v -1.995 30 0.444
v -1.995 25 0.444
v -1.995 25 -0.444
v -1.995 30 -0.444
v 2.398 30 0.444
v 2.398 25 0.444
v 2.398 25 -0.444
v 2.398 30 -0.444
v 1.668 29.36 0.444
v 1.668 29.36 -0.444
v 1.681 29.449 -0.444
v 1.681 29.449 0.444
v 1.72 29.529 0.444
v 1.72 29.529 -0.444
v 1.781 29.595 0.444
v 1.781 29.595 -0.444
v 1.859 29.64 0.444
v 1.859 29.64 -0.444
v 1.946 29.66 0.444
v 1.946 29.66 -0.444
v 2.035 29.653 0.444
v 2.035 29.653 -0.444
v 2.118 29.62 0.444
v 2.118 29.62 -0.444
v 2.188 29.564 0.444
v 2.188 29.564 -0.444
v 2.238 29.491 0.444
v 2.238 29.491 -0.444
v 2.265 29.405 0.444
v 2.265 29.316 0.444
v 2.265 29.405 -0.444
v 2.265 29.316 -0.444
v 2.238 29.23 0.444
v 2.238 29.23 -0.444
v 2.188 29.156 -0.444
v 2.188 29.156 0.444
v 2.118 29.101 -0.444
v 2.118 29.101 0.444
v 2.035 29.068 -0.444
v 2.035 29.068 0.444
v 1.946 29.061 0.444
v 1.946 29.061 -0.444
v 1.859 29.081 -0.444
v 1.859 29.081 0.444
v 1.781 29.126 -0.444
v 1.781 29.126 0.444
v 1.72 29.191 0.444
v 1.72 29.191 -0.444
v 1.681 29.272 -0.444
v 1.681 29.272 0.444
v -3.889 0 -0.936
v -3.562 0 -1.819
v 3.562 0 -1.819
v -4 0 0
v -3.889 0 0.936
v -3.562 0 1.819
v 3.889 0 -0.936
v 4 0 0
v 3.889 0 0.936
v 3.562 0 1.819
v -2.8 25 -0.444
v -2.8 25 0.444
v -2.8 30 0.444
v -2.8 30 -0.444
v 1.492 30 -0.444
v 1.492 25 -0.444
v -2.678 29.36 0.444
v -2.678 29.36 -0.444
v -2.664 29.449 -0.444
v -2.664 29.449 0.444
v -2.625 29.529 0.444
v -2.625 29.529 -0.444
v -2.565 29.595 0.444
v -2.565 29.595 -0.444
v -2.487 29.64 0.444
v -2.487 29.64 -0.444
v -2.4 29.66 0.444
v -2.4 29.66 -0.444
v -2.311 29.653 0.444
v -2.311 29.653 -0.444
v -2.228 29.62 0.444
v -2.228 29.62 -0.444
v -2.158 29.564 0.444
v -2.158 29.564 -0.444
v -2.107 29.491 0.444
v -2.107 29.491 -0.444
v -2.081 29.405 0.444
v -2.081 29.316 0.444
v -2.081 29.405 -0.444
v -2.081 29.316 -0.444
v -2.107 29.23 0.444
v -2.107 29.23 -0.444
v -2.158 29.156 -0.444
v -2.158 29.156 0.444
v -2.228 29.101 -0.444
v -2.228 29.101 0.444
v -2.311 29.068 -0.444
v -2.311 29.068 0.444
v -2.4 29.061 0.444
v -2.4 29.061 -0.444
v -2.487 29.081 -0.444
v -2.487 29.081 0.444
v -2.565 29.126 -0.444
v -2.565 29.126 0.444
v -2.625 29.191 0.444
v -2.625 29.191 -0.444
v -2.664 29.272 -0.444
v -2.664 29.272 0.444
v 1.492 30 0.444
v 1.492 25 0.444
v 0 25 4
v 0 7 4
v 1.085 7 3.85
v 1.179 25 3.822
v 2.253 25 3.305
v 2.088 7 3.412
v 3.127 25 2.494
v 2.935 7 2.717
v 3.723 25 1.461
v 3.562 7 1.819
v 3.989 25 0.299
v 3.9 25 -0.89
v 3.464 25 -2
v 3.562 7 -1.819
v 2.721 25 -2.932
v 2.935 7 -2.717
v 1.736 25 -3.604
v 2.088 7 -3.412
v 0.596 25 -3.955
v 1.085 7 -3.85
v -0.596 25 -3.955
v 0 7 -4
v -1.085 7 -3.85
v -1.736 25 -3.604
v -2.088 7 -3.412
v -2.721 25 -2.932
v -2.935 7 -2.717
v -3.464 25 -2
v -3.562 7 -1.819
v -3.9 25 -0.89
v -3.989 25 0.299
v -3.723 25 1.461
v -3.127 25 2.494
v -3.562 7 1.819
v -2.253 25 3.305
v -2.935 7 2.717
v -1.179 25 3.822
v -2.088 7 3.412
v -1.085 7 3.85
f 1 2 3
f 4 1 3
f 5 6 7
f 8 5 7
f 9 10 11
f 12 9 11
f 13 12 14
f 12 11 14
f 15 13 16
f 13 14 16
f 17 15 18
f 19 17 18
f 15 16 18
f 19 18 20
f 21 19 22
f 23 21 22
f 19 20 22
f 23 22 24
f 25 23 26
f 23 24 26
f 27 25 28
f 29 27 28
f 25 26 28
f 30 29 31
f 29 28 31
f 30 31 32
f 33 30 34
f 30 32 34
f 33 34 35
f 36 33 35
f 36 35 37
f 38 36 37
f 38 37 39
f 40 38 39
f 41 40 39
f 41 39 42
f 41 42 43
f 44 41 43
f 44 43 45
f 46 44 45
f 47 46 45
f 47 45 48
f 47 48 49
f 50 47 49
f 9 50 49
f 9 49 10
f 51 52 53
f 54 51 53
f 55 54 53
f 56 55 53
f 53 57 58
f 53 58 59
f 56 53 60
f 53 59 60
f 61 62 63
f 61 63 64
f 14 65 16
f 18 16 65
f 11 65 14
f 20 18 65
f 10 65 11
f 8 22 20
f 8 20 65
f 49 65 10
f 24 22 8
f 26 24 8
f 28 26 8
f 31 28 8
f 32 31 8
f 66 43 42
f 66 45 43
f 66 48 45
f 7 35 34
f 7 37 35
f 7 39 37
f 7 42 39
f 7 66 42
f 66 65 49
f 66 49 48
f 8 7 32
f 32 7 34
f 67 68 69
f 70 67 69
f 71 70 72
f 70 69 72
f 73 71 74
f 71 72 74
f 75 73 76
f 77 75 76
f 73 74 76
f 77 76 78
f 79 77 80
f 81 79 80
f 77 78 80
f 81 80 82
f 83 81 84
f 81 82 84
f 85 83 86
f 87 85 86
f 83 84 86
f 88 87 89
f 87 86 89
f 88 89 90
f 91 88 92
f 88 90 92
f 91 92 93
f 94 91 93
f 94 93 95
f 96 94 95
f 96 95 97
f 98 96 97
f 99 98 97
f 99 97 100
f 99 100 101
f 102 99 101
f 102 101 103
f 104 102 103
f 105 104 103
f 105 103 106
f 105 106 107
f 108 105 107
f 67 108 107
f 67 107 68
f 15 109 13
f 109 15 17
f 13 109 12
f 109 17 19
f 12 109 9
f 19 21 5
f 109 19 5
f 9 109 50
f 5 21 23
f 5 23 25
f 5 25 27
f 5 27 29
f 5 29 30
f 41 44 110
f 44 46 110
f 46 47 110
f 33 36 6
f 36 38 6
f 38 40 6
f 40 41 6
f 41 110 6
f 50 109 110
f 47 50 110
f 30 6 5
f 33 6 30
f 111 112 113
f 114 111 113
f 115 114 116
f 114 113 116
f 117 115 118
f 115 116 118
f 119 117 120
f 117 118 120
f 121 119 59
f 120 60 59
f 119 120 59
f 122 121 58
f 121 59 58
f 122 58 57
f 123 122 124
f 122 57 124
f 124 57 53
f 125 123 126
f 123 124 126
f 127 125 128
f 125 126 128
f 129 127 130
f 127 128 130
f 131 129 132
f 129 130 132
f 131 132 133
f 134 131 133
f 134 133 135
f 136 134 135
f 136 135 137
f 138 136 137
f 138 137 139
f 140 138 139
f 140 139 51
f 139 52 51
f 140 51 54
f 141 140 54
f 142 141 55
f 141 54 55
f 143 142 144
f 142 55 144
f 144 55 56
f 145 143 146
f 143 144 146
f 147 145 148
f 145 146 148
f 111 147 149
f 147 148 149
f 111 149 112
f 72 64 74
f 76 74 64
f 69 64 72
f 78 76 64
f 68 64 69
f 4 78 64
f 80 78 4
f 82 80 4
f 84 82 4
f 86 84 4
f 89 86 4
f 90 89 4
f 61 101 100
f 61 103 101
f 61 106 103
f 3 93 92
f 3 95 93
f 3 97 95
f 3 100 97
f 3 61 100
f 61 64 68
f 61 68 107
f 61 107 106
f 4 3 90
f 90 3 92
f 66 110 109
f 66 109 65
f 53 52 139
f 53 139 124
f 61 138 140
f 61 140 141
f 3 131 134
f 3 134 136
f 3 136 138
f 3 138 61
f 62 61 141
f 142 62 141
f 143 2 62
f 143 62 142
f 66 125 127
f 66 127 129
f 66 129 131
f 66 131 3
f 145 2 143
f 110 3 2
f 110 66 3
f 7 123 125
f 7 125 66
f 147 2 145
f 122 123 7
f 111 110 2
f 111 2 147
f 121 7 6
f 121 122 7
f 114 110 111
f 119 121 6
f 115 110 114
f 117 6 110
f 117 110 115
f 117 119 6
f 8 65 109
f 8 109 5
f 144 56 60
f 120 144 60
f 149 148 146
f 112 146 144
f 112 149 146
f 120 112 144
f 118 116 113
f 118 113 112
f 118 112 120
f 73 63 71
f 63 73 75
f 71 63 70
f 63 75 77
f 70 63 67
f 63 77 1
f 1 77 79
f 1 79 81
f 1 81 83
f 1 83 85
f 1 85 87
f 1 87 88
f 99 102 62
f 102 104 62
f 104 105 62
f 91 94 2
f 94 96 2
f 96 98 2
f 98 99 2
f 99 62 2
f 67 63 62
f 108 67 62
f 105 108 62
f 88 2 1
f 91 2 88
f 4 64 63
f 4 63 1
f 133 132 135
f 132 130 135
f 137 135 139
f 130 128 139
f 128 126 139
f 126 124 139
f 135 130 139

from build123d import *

# Parameters (mm, degrees)
SKETCH2_R           = 4
BOSS_EXTRUDE1_DEPTH = 25
CUT_EXTRUDE1_DEPTH  = 7
SKETCH6_W           = 0.80480735
SKETCH6_H           = 0.88864145
SKETCH6_W_2         = 0.905408268
BOSS_EXTRUDE2_DEPTH = 5
SKETCH7_R           = 0.3
CUT_EXTRUDE2_DEPTH  = 5


with BuildPart() as part:
    # Sketch2 → Boss-Extrude1 (new body)
    with BuildSketch(Plane(origin=(0, 0, 0), x_dir=(1, 0, 0), z_dir=(0, 1, 0))):
        with Locations(Location((0, 0, 0), (0, 0, 270))):
            Circle(SKETCH2_R)
    extrude(amount=BOSS_EXTRUDE1_DEPTH)

    # Sketch3 → Cut-Extrude1 (cut)
    with BuildSketch(Plane.XZ):
        with BuildLine():
            Line((-4.426440425, 1.819199948), (4.426440425, 1.819199948))
            ThreePointArc((4.426440425, 1.819199948), (0, 4.216961573), (-4.426440425, 1.819199948))
        make_face()
        with BuildLine():
            Line((-4.426440425, -1.819199948), (4.426440425, -1.819199948))
            ThreePointArc((4.426440425, -1.819199948), (0, -4.323632304), (-4.426440425, -1.819199948))
        make_face()
    extrude(amount=-CUT_EXTRUDE1_DEPTH, mode=Mode.SUBTRACT)

    # Sketch6 → Boss-Extrude2 (add)
    with BuildSketch(Plane(origin=(0, 25, 0), x_dir=(1, 0, 0), z_dir=(0, 1, 0))):
        with Locations((-2.39765523, 0)):
            Rectangle(SKETCH6_W, SKETCH6_H)
        with Locations((1.944951096, 0)):
            Rectangle(SKETCH6_W_2, SKETCH6_H)
    extrude(amount=BOSS_EXTRUDE2_DEPTH)

    # Sketch7 → Cut-Extrude2 (cut)
    with BuildSketch(Plane(origin=(0, 0, -0.444320725), x_dir=(-1, 0, 0), z_dir=(0, 0, -1))):
        with Locations((-1.968156059, 29.360387354)):
            Circle(SKETCH7_R)
        with Locations((2.377573757, 29.360387354)):
            Circle(SKETCH7_R)
    extrude(amount=-CUT_EXTRUDE2_DEPTH, mode=Mode.SUBTRACT)


solid = part.part
